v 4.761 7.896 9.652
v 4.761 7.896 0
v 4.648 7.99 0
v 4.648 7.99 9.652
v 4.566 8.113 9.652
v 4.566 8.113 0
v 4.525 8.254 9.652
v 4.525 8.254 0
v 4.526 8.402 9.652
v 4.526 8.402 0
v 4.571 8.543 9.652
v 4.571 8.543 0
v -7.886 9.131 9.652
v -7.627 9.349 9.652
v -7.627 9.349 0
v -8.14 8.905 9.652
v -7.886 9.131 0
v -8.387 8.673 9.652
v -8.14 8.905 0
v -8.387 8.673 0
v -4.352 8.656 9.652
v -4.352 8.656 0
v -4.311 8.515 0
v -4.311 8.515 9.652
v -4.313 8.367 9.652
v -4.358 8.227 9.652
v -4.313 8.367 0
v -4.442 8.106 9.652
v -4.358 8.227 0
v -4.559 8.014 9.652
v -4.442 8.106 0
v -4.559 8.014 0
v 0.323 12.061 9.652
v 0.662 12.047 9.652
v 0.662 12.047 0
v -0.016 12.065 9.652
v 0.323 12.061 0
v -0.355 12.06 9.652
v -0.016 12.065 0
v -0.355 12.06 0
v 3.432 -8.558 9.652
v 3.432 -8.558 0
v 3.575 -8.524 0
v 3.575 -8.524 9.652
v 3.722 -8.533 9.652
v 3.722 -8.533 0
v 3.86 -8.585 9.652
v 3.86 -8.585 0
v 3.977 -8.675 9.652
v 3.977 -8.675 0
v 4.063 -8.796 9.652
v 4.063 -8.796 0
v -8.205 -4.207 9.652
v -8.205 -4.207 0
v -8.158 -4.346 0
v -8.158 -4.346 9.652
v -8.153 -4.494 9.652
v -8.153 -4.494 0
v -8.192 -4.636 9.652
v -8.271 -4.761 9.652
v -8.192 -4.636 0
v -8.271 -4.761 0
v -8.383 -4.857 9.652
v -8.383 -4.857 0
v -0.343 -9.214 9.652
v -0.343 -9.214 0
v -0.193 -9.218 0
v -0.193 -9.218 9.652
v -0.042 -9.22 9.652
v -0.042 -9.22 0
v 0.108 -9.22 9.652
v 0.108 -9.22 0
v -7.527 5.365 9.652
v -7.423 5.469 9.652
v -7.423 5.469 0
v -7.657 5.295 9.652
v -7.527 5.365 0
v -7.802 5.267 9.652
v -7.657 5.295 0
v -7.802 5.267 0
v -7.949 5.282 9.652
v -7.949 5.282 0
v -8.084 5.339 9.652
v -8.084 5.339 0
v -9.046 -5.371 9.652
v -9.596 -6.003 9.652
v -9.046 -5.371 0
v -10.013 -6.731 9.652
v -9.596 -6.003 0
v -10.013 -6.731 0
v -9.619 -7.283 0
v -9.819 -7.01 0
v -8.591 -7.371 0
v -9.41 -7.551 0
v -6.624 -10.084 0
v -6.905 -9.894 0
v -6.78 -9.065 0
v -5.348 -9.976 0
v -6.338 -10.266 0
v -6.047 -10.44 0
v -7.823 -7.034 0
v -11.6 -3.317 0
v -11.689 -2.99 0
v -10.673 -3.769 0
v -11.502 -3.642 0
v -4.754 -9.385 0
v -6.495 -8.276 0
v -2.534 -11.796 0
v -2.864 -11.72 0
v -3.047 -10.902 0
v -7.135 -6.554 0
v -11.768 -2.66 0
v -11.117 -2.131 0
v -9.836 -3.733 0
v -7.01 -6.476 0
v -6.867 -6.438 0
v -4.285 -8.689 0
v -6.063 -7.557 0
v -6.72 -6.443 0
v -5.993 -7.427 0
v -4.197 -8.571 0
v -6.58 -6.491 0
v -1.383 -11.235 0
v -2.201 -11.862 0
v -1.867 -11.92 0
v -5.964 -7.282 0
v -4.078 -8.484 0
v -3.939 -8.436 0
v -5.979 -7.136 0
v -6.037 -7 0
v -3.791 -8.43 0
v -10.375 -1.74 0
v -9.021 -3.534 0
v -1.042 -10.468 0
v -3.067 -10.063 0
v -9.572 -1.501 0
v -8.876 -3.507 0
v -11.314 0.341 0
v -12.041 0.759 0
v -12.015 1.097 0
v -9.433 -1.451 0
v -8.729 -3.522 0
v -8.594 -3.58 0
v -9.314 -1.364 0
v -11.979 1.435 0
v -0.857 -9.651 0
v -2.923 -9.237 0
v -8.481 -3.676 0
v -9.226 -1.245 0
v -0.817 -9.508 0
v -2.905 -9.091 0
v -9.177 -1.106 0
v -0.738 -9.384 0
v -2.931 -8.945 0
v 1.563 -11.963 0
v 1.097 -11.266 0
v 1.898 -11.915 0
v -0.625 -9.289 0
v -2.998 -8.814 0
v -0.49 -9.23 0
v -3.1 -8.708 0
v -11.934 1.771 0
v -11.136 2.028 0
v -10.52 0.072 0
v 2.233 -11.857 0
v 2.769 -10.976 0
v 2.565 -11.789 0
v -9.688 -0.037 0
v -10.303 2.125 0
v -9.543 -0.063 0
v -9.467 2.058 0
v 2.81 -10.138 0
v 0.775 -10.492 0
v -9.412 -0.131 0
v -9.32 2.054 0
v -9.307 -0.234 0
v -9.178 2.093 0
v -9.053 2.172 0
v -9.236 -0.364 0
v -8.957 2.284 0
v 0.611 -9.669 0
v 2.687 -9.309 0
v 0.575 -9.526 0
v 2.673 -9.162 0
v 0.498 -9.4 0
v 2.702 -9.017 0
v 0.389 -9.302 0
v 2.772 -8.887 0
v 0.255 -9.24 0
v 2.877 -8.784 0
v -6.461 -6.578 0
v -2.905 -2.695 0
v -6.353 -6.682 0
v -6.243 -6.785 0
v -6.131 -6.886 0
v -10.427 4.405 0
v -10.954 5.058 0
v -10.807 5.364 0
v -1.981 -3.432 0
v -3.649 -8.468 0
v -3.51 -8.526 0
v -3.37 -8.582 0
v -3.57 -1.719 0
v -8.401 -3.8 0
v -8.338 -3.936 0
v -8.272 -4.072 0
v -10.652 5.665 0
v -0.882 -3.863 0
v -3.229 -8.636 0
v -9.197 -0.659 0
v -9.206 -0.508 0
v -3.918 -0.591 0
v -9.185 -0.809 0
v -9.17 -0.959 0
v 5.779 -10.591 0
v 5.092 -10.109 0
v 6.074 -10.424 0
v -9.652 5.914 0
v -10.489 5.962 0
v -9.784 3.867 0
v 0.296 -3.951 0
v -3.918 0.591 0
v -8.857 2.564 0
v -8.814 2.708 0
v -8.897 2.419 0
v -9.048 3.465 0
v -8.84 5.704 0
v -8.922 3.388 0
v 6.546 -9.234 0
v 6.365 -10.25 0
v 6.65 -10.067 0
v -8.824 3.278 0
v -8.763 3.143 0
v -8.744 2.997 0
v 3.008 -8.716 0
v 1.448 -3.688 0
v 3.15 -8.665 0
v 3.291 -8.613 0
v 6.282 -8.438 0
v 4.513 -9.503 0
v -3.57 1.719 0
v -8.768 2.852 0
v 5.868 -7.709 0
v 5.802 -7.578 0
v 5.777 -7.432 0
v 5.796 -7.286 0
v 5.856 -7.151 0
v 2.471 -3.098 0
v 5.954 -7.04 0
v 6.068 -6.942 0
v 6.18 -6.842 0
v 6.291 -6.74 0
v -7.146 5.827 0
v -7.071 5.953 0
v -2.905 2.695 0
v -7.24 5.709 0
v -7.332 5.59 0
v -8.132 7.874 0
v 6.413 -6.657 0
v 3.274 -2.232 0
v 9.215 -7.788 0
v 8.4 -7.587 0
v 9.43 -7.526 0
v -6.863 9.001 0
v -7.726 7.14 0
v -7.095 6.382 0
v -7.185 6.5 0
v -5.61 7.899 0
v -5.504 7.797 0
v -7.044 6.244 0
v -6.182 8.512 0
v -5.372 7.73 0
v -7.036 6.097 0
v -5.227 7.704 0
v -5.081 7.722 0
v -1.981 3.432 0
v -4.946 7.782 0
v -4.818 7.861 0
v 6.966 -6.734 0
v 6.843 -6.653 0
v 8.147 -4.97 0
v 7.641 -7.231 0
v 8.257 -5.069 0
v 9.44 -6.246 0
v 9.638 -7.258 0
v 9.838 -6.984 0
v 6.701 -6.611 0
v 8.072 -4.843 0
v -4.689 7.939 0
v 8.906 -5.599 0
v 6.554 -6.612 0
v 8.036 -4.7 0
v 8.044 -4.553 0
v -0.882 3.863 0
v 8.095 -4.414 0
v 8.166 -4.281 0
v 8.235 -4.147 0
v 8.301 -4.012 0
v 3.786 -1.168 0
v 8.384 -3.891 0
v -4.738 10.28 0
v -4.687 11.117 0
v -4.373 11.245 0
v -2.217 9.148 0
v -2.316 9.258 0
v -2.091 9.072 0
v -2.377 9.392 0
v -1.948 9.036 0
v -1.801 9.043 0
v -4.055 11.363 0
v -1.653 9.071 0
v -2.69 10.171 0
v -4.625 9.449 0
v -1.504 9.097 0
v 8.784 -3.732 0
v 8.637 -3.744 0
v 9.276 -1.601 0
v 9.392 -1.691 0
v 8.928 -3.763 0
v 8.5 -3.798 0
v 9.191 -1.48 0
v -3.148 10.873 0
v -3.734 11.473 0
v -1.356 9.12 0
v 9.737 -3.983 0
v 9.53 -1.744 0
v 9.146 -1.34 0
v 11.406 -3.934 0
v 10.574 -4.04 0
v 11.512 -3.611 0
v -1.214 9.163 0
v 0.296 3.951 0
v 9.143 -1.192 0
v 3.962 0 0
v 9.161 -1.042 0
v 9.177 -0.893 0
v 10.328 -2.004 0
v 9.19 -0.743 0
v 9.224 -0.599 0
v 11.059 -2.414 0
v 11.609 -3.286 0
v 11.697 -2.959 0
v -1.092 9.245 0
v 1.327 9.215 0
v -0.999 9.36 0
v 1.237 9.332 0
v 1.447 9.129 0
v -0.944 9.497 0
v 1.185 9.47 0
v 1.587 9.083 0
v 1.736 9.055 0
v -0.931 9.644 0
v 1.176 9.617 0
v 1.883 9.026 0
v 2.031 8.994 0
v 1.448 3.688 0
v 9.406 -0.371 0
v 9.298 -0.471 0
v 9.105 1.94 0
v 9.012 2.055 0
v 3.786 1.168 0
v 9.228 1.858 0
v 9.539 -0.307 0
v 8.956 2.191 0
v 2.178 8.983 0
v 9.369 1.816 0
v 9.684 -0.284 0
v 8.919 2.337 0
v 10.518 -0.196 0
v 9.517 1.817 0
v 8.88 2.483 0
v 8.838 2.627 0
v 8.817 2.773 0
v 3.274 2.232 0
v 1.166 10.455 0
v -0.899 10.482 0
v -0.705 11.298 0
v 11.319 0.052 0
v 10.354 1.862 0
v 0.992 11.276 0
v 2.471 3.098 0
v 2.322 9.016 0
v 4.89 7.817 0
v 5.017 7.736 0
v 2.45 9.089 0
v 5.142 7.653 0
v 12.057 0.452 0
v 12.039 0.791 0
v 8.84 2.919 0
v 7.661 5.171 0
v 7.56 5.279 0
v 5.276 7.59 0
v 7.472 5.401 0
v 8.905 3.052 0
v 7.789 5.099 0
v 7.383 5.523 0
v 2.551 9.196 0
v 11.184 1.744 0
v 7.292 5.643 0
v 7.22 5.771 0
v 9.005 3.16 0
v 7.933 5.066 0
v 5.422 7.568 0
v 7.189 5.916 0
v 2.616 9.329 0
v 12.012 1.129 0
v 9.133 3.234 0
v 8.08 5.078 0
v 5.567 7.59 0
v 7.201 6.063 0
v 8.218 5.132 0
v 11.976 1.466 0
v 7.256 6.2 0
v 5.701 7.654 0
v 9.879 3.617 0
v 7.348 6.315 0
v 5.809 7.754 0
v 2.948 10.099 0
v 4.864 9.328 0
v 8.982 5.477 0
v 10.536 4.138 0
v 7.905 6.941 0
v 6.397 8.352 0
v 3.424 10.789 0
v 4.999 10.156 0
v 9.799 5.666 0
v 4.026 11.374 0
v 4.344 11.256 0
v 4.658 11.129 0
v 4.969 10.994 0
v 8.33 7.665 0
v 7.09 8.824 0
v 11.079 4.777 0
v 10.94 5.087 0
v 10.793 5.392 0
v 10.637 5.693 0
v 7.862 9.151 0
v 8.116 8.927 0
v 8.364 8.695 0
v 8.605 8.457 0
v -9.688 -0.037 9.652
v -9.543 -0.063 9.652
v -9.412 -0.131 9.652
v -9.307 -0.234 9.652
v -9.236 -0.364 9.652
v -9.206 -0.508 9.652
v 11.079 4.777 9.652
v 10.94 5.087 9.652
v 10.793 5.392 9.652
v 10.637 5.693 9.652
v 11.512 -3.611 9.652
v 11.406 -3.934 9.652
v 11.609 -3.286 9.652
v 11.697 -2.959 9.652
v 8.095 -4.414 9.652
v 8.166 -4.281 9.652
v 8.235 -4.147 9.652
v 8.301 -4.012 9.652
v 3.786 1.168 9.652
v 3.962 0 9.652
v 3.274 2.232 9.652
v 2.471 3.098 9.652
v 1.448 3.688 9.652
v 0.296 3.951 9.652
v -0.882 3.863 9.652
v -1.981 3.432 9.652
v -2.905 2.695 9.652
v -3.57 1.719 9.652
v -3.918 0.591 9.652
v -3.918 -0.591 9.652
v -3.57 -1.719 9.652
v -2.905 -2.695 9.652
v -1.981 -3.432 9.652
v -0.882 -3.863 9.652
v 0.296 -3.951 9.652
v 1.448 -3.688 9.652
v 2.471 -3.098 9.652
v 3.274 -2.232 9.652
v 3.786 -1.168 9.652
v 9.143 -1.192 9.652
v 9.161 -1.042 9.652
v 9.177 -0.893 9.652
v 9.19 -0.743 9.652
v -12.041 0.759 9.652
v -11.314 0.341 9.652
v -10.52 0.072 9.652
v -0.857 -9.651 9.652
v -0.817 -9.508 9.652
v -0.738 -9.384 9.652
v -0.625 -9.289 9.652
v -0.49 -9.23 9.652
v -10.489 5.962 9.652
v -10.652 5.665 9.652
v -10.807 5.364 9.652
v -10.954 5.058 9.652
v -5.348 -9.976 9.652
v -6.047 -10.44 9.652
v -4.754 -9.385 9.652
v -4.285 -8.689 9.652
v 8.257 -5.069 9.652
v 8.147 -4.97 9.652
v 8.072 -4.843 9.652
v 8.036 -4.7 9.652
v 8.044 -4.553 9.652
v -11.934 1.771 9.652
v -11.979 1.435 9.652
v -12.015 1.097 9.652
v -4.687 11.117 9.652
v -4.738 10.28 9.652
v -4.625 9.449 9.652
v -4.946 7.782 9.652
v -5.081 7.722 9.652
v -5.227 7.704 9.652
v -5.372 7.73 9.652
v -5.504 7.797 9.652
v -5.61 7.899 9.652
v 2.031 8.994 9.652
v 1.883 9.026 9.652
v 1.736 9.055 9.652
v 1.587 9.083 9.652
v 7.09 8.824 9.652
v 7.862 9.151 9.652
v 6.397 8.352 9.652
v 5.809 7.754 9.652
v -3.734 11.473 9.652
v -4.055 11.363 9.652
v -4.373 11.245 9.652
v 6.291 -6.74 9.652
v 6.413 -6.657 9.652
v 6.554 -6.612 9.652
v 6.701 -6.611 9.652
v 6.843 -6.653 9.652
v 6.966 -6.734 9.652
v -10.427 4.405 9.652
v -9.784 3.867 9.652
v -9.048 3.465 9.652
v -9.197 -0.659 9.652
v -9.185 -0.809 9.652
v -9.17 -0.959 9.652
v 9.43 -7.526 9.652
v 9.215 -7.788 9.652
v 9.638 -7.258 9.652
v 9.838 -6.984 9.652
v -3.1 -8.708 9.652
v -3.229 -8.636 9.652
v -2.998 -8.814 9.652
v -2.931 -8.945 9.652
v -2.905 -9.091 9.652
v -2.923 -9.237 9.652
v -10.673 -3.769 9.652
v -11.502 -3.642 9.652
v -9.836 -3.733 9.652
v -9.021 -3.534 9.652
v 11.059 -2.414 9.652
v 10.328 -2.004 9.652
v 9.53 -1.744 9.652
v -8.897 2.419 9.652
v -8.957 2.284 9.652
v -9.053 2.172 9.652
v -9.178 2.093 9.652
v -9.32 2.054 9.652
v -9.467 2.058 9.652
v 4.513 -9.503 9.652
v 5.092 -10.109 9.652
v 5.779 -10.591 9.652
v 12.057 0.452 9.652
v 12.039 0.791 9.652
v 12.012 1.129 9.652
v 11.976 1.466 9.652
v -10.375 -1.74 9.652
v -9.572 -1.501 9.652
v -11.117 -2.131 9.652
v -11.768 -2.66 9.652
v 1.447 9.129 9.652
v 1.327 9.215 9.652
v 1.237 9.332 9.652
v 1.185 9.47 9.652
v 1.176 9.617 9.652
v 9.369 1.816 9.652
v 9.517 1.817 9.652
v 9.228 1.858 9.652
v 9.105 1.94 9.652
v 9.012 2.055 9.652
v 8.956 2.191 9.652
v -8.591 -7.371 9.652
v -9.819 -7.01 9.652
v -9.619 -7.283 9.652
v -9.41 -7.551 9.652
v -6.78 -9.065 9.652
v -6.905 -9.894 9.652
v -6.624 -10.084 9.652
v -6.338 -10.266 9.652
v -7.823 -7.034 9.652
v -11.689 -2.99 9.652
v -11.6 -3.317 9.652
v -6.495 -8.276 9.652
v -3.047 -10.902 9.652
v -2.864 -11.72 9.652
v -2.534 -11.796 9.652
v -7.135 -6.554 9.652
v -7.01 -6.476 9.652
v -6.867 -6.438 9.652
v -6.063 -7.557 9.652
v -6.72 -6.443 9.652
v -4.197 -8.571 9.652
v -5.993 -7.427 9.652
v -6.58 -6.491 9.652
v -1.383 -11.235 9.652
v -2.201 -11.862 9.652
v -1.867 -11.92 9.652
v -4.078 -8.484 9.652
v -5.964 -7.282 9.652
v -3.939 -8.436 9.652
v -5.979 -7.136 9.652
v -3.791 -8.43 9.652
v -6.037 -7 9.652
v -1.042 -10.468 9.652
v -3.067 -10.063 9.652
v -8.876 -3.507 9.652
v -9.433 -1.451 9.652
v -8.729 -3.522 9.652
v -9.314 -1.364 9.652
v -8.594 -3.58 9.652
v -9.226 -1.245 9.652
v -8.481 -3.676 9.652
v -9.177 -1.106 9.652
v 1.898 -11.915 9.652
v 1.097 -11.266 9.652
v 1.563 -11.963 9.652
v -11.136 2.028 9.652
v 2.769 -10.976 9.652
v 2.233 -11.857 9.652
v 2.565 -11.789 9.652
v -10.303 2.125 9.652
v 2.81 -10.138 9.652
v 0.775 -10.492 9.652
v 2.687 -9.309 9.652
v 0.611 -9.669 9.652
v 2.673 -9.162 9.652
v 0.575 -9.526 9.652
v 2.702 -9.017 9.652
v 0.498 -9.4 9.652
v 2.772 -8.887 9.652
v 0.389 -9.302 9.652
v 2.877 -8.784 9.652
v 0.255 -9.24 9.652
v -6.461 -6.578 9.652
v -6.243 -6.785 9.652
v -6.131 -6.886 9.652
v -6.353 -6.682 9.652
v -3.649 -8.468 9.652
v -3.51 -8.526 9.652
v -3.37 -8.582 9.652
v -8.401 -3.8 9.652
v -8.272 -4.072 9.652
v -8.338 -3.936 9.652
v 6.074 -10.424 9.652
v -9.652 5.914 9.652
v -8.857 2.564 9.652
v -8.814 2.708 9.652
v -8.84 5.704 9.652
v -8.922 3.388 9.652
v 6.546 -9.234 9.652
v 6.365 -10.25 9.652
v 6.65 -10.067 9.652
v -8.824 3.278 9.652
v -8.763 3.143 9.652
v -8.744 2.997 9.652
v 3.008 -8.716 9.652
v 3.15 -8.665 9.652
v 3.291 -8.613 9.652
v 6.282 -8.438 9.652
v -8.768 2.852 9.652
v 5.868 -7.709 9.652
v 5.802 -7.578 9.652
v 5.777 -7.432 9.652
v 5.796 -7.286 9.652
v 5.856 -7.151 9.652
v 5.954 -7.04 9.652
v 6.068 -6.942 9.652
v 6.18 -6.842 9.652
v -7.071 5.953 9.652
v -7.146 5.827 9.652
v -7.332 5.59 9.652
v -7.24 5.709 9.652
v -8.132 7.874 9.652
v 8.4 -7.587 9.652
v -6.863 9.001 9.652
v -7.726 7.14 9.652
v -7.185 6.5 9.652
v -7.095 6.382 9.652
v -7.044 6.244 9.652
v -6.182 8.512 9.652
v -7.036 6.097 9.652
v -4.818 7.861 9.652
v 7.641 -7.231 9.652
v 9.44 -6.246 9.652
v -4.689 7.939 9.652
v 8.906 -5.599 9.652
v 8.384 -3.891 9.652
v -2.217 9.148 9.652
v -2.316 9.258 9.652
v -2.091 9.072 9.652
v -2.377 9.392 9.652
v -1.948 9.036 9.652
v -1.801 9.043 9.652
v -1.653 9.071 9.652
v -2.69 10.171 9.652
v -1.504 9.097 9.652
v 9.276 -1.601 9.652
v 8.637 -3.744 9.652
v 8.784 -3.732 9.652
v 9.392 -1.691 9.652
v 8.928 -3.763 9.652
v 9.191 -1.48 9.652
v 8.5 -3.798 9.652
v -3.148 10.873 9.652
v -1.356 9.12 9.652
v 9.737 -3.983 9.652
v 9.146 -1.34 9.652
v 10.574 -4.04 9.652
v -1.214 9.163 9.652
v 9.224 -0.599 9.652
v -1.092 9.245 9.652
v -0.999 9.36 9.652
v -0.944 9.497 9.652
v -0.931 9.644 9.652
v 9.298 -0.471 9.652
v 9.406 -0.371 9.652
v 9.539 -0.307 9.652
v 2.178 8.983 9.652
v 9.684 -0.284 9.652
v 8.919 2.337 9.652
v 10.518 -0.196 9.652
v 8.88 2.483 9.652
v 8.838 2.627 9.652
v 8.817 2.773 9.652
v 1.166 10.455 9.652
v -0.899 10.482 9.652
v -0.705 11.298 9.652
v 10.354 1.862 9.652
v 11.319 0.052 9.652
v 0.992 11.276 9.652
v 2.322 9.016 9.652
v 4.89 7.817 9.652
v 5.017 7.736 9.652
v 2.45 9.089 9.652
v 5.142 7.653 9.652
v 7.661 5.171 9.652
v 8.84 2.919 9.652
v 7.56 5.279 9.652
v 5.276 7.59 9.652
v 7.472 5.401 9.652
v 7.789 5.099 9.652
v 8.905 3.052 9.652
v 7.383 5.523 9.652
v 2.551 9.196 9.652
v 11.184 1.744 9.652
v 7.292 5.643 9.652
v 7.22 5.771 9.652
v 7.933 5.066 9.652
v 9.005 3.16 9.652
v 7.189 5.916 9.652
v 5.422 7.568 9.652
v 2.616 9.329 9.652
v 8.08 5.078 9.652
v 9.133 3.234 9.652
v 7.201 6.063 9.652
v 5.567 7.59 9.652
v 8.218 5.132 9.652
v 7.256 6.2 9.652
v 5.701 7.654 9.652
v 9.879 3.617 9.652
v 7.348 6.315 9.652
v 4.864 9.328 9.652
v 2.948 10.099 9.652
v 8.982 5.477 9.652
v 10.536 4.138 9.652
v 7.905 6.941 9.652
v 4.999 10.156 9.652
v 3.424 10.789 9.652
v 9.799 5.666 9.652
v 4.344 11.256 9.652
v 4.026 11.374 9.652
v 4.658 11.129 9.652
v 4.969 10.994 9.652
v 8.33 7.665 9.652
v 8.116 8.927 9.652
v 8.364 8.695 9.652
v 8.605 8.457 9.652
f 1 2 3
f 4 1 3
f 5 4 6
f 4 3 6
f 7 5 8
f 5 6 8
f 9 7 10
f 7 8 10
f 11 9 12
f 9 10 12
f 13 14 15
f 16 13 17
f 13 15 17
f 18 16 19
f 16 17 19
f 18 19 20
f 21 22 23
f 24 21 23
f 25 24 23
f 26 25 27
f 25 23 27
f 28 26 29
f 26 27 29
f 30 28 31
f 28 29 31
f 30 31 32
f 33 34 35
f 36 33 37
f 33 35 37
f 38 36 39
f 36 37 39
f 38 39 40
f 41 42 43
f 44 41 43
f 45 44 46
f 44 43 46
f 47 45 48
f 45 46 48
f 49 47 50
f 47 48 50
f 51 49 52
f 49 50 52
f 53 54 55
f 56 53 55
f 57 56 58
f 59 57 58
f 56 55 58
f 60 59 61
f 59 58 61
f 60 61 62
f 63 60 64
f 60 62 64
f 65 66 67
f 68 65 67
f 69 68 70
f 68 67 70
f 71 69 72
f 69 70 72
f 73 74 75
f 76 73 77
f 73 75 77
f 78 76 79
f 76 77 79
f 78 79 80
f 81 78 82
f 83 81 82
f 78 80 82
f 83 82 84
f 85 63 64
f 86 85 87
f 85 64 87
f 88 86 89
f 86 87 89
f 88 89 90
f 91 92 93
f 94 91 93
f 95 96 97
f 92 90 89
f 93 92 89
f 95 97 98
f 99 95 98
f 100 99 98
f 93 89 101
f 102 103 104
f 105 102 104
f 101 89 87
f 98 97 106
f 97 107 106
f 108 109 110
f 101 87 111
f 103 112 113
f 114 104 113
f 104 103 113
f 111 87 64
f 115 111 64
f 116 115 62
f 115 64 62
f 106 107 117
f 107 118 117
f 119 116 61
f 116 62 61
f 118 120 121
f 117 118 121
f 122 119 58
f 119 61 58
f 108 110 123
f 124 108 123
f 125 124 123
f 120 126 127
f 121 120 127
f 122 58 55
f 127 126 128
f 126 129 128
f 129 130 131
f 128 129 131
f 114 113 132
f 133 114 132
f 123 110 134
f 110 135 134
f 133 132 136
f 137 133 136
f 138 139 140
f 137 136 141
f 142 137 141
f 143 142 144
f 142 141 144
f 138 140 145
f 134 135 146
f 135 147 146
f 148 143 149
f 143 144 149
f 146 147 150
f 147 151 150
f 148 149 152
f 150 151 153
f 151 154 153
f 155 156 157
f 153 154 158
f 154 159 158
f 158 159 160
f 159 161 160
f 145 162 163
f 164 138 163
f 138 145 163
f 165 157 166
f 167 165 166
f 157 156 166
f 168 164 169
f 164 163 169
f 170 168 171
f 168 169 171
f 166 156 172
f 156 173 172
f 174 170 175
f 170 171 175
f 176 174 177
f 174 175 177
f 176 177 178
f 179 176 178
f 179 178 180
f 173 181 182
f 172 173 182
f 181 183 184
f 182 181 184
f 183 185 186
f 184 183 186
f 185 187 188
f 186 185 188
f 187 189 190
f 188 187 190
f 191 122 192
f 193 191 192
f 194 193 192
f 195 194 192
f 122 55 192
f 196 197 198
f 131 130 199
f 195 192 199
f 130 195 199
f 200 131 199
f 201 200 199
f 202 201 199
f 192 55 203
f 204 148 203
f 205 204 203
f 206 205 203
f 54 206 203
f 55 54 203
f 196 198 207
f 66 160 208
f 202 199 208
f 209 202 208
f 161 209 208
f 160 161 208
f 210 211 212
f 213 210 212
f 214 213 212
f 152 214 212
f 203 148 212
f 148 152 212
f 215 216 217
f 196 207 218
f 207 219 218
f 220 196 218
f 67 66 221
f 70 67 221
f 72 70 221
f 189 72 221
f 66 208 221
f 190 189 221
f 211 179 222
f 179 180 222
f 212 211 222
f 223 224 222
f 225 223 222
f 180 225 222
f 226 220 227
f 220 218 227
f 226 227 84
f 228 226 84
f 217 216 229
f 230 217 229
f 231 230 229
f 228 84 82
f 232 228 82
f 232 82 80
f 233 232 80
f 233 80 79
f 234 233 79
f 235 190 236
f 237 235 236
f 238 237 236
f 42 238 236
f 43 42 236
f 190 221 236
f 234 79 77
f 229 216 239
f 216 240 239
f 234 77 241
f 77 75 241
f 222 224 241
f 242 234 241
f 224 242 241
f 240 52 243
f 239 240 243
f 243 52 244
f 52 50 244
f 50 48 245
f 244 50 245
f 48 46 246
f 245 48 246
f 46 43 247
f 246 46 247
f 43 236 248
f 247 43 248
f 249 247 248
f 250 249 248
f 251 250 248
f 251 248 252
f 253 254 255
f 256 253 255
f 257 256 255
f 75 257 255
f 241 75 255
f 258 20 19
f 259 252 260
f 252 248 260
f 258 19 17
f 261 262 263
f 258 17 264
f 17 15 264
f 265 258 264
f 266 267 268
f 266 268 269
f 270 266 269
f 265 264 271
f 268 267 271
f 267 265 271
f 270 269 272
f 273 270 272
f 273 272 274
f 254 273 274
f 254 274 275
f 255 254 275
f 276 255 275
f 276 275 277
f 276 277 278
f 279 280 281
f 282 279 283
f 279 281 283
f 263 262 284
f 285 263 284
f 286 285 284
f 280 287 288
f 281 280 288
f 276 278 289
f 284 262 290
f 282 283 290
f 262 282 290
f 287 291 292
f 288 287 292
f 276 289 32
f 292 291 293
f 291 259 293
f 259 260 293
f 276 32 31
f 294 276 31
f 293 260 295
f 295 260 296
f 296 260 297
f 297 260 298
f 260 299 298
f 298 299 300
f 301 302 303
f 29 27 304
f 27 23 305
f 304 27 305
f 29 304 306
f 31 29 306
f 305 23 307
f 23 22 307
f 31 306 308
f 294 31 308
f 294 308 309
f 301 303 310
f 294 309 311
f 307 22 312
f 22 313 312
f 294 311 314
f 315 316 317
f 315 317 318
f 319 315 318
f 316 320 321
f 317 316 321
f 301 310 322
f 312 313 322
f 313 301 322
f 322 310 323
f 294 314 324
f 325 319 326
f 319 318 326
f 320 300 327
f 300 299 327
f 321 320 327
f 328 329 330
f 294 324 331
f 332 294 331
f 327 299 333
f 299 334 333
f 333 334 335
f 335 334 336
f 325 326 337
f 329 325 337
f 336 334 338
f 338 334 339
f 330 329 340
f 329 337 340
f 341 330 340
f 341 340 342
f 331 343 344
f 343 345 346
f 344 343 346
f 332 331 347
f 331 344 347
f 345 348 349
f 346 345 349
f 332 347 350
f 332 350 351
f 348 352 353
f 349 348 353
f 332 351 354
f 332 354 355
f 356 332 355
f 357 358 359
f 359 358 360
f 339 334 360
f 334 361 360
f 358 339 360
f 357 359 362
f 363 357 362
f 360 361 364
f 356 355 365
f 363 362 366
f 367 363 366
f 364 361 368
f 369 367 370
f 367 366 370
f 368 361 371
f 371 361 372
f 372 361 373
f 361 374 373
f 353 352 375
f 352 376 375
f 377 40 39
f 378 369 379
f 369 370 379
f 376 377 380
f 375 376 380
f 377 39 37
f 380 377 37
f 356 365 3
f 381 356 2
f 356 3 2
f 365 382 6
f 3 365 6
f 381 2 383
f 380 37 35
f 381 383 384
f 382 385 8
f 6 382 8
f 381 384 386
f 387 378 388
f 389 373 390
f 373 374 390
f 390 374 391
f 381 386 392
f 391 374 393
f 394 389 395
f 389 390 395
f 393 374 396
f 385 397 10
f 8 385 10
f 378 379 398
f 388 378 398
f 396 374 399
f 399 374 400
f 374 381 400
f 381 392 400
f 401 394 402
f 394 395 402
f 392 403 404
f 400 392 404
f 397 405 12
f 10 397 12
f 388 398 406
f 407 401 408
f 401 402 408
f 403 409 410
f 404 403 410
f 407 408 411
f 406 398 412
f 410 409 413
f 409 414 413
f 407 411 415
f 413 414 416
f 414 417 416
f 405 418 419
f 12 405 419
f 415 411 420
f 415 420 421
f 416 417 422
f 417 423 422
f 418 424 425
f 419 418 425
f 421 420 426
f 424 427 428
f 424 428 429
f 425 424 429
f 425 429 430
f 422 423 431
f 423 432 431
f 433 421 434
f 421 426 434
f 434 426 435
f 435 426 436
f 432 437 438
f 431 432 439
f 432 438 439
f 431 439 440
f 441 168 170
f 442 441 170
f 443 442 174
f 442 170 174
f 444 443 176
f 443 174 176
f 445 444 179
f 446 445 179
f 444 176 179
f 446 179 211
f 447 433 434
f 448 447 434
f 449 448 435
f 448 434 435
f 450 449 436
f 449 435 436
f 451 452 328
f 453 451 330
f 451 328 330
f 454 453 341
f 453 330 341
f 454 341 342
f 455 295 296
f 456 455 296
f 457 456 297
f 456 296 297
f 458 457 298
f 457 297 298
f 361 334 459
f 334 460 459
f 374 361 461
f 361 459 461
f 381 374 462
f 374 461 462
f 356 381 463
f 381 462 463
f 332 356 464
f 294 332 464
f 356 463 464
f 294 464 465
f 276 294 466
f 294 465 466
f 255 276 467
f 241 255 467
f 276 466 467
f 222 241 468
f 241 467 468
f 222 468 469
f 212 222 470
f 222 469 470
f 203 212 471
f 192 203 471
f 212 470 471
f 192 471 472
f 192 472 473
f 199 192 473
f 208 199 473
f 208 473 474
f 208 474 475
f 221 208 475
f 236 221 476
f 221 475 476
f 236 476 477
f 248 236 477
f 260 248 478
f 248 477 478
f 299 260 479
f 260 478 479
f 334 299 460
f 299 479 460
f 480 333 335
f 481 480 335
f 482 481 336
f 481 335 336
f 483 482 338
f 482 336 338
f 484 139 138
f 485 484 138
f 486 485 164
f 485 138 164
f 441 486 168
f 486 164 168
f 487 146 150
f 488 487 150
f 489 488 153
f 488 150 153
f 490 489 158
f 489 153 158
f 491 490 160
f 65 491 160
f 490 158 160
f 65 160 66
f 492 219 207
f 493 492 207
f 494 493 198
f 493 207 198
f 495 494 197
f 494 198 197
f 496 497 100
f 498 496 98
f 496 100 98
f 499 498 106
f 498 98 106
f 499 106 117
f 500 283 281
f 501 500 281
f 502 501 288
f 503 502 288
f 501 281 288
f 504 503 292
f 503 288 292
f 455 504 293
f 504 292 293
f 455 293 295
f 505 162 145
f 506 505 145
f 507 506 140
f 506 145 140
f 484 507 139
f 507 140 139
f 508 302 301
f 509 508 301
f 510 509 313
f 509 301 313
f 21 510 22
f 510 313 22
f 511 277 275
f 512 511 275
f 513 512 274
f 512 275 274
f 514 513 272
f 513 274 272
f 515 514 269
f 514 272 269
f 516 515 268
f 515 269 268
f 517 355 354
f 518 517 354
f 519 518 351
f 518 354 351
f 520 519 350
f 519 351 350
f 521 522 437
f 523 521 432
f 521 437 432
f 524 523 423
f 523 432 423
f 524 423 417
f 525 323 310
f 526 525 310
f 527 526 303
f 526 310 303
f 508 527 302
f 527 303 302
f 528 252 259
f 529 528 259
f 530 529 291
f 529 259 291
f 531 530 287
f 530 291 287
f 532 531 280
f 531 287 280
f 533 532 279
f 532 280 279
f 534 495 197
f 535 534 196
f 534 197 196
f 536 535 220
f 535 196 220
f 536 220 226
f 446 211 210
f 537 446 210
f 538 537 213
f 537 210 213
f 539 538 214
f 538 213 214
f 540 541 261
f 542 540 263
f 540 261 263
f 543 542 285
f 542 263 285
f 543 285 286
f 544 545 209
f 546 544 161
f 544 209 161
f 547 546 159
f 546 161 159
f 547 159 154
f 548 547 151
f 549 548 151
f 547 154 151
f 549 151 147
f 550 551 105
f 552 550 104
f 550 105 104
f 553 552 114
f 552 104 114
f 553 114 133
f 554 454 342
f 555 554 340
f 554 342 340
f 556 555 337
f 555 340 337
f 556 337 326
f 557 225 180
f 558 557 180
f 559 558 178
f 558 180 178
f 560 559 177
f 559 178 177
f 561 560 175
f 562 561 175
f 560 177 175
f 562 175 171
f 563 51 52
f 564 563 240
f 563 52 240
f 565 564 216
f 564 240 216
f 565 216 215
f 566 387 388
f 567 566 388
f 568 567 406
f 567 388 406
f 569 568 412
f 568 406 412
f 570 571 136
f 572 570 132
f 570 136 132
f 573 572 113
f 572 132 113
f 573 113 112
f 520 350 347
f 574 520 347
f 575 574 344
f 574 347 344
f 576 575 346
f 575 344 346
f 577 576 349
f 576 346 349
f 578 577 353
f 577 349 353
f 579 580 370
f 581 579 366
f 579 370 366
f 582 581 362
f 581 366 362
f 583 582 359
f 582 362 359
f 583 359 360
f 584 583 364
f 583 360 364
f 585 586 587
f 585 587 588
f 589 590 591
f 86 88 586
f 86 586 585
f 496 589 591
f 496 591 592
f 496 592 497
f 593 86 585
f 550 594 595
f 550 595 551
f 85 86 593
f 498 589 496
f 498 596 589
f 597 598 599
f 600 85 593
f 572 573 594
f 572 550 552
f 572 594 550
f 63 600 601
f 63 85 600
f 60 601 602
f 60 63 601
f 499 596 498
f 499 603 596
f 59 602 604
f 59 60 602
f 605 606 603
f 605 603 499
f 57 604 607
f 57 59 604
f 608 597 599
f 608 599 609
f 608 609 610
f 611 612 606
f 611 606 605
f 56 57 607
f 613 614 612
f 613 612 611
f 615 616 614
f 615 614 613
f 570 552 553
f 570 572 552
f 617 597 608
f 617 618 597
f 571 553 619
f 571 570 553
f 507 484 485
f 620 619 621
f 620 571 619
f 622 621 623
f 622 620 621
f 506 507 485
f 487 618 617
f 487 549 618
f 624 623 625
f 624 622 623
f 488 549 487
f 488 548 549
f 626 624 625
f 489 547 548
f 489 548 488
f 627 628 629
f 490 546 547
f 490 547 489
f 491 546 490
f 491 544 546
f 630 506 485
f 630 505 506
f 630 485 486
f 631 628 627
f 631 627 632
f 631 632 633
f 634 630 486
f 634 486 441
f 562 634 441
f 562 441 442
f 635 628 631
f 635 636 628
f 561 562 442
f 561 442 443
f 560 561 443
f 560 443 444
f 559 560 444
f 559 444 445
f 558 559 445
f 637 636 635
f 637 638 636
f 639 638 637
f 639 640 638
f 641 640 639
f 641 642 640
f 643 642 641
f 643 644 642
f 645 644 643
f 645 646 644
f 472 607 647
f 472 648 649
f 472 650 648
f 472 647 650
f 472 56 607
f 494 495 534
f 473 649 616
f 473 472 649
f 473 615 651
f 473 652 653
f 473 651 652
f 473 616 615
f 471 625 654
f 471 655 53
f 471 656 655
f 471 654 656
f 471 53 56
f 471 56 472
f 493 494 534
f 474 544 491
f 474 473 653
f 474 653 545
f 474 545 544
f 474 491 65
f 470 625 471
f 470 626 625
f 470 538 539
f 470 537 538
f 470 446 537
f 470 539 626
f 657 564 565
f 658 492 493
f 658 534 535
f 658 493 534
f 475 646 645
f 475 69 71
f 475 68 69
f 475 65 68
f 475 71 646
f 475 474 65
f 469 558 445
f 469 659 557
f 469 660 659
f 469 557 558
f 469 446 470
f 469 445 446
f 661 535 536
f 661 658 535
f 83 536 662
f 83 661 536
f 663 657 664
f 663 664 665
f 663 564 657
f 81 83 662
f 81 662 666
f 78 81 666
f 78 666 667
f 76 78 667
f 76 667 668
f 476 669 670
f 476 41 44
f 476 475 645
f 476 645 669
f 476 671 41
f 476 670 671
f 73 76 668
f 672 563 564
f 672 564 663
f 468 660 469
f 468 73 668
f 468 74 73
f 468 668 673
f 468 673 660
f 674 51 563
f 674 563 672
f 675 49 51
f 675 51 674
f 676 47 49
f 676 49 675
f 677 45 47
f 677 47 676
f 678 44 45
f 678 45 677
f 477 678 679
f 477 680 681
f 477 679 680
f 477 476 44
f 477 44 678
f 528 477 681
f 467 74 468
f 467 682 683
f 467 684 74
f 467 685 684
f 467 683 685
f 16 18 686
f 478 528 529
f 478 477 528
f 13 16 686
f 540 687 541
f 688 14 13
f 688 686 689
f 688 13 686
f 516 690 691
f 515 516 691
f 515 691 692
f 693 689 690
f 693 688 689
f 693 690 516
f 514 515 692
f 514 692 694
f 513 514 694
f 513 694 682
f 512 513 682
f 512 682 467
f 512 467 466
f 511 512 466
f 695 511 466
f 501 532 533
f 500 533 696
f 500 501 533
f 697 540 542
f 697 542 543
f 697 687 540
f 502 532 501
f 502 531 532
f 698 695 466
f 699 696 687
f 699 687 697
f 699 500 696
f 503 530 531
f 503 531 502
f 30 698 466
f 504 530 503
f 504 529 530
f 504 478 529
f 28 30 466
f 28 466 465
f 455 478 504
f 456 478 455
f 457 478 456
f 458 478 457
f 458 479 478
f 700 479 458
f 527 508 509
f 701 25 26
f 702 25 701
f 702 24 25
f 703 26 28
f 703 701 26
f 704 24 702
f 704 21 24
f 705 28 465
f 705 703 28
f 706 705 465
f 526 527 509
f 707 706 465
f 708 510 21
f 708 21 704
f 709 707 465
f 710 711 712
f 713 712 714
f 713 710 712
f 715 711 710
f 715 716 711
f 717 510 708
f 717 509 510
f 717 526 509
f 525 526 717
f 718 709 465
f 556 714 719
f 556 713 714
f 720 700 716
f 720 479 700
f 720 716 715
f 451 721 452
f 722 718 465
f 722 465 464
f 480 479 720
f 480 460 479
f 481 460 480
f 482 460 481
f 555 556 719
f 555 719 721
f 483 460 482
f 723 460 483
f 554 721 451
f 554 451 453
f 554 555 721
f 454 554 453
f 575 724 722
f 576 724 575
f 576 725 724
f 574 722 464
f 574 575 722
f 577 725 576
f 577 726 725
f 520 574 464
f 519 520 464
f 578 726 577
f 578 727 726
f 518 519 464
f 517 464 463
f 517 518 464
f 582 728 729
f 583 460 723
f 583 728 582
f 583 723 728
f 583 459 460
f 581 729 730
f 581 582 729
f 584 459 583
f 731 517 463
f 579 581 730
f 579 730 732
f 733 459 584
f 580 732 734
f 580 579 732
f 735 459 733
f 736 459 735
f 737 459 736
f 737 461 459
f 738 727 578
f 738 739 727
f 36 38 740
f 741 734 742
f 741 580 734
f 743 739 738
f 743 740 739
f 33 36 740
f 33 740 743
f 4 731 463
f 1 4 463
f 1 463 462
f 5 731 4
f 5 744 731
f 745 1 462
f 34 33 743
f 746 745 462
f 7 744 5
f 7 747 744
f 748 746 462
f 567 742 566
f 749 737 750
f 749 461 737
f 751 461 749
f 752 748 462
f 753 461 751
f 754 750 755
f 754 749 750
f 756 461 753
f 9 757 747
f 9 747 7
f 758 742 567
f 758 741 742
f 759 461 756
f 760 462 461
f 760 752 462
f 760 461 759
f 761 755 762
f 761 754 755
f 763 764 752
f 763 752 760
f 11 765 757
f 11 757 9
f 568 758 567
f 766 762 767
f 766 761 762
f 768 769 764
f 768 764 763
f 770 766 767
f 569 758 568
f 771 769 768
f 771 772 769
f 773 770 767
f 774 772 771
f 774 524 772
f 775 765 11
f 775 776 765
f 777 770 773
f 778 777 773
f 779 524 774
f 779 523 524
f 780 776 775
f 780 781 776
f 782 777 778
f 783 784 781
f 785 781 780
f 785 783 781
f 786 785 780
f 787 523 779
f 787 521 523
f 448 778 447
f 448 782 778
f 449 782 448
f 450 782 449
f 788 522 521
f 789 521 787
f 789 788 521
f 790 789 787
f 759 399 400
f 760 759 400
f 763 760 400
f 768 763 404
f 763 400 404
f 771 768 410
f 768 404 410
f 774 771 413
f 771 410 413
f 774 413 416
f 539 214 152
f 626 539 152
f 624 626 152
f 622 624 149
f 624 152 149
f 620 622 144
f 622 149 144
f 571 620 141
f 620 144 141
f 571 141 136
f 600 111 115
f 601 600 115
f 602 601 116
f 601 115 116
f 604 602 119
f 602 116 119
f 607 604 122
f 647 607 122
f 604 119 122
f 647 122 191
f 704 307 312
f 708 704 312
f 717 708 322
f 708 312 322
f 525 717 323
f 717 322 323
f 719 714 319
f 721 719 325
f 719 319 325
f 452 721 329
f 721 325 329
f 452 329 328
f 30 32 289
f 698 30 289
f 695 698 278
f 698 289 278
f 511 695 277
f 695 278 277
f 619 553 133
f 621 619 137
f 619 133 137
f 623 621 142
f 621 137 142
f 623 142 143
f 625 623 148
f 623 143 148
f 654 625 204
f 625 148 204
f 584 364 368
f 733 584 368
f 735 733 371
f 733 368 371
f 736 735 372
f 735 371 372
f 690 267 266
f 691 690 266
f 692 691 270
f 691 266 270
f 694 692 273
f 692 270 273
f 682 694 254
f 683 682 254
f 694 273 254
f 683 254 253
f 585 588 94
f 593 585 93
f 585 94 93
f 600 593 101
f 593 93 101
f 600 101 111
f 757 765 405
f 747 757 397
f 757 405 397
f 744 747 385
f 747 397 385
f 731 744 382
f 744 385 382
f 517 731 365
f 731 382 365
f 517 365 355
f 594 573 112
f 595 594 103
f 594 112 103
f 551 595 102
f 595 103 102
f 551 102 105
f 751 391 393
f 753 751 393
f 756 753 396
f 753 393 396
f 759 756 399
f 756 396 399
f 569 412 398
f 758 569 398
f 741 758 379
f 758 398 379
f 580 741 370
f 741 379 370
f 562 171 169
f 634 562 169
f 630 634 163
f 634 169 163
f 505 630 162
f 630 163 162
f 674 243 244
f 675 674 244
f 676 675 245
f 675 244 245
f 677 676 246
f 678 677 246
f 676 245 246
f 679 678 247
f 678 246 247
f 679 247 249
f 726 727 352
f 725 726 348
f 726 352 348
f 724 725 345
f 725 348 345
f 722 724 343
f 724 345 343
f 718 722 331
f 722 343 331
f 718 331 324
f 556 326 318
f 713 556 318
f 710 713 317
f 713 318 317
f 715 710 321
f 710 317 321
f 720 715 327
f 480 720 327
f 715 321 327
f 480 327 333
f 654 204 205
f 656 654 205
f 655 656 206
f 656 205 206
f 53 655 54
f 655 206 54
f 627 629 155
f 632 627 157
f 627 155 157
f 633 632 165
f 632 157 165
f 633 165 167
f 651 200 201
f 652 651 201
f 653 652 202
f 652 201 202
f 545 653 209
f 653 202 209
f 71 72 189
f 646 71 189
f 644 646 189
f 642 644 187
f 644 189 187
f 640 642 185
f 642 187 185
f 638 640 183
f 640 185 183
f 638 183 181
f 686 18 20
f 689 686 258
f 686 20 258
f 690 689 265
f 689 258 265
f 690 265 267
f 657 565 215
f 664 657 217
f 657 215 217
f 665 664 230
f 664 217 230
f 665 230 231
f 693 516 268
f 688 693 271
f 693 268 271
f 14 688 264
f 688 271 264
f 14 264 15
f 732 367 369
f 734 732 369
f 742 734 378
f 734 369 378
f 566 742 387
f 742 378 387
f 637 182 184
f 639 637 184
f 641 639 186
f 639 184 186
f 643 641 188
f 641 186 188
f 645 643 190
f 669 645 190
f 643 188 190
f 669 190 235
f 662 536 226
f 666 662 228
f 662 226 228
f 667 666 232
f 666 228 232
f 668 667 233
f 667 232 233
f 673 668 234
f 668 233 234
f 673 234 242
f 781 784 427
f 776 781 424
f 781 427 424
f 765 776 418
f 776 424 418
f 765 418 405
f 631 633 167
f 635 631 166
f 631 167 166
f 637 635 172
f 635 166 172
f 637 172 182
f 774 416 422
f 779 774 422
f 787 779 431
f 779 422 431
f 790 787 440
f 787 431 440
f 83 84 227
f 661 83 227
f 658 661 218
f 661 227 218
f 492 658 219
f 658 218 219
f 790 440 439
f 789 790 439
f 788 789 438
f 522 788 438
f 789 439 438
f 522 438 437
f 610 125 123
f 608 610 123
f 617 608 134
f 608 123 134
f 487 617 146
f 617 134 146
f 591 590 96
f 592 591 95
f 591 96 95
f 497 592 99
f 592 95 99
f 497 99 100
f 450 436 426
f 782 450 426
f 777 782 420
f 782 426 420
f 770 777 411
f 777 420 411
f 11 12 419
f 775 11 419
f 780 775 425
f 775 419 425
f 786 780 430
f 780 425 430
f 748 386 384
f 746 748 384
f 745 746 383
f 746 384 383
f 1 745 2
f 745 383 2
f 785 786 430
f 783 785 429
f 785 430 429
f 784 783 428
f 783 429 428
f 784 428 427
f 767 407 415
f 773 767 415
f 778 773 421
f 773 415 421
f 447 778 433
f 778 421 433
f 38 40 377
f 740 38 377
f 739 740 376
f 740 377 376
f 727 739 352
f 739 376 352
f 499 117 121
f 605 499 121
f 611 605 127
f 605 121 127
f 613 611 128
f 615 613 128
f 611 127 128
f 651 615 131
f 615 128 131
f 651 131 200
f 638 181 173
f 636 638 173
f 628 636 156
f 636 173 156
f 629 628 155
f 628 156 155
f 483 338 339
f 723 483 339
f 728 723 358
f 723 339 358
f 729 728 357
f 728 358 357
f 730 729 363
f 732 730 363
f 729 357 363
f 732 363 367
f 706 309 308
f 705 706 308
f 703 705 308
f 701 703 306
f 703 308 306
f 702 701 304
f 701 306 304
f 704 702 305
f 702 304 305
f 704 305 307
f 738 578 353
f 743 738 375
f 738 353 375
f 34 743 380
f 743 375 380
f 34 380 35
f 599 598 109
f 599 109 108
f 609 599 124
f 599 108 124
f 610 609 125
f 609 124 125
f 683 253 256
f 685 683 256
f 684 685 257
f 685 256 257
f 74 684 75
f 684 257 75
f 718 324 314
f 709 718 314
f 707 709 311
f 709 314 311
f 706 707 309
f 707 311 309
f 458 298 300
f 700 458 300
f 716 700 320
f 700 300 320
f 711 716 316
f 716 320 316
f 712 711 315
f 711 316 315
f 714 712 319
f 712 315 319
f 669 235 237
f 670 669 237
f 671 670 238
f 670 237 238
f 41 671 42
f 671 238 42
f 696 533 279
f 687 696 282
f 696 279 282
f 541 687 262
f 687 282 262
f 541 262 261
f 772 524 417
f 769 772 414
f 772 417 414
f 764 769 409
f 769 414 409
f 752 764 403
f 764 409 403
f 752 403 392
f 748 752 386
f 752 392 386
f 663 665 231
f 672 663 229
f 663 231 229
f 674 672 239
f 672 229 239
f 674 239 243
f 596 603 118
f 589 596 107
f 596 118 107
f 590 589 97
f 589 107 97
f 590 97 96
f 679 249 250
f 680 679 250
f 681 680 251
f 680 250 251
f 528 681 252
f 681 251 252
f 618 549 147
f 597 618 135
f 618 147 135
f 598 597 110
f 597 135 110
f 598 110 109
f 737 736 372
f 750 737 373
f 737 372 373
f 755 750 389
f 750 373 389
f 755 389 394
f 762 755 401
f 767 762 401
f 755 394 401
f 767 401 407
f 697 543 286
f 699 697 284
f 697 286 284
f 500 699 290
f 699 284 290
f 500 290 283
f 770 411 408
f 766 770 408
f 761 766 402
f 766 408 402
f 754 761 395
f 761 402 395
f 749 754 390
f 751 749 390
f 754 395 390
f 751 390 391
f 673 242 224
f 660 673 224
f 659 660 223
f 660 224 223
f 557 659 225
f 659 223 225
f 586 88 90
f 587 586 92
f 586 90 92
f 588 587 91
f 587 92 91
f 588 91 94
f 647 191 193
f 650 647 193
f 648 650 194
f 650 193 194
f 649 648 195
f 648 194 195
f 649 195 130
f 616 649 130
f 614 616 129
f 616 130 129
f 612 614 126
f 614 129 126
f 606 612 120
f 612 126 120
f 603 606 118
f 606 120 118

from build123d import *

# Parameters (mm, degrees)
SKETCH3_R         = 12.065
GEARBODY_DEPTH    = 9.652
TOOTHCUT_DEPTH    = 10.652
CIRPATTERN1_COUNT = 17
BOREDIA_R         = 3.9624
BORE_DEPTH        = 12700


with BuildPart() as part:
    # Sketch3 → gearBody (new body)
    with BuildSketch(Plane.XY):
        Circle(SKETCH3_R)
    extrude(amount=GEARBODY_DEPTH)

    # Sketch2 → toothCut (cut, through all)
    with BuildSketch(Plane.XY):
        with BuildLine():
            ThreePointArc((9.142823661, -1.191999807), (9.169284766, -0.967628503), (9.19024048, -0.742676218))
            ThreePointArc((9.19024048, -0.742676218), (9.348086694, -0.417154866), (9.684376414, -0.283780197))
            ThreePointArc((9.684376414, -0.283780197), (11.669443263, 0.21905505), (13.194238308, 1.585925107))
            ThreePointArc((13.194238308, 1.585925107), (13.215824396, -1.39465713), (12.572564615, -4.305078625))
            ThreePointArc((12.572564615, -4.305078625), (11.366669508, -2.650040659), (9.530287729, -1.743930488))
            ThreePointArc((9.530287729, -1.743930488), (9.229245497, -1.543298603), (9.142823661, -1.191999807))
        make_face()
    toothcut = extrude(amount=TOOTHCUT_DEPTH, mode=Mode.SUBTRACT)

    # CirPattern1: toothCut ×17 about axis
    cirpattern1_axis = Axis((0, 0, 0), (0, 0, 1))
    for i in range(1, CIRPATTERN1_COUNT):
        add(toothcut.rotate(cirpattern1_axis, i * 360 / CIRPATTERN1_COUNT), mode=Mode.SUBTRACT)

    # boreDia → bore (cut, symmetric)
    with BuildSketch(Plane.XY):
        Circle(BOREDIA_R)
    extrude(amount=BORE_DEPTH, both=True, mode=Mode.SUBTRACT)


solid = part.part
